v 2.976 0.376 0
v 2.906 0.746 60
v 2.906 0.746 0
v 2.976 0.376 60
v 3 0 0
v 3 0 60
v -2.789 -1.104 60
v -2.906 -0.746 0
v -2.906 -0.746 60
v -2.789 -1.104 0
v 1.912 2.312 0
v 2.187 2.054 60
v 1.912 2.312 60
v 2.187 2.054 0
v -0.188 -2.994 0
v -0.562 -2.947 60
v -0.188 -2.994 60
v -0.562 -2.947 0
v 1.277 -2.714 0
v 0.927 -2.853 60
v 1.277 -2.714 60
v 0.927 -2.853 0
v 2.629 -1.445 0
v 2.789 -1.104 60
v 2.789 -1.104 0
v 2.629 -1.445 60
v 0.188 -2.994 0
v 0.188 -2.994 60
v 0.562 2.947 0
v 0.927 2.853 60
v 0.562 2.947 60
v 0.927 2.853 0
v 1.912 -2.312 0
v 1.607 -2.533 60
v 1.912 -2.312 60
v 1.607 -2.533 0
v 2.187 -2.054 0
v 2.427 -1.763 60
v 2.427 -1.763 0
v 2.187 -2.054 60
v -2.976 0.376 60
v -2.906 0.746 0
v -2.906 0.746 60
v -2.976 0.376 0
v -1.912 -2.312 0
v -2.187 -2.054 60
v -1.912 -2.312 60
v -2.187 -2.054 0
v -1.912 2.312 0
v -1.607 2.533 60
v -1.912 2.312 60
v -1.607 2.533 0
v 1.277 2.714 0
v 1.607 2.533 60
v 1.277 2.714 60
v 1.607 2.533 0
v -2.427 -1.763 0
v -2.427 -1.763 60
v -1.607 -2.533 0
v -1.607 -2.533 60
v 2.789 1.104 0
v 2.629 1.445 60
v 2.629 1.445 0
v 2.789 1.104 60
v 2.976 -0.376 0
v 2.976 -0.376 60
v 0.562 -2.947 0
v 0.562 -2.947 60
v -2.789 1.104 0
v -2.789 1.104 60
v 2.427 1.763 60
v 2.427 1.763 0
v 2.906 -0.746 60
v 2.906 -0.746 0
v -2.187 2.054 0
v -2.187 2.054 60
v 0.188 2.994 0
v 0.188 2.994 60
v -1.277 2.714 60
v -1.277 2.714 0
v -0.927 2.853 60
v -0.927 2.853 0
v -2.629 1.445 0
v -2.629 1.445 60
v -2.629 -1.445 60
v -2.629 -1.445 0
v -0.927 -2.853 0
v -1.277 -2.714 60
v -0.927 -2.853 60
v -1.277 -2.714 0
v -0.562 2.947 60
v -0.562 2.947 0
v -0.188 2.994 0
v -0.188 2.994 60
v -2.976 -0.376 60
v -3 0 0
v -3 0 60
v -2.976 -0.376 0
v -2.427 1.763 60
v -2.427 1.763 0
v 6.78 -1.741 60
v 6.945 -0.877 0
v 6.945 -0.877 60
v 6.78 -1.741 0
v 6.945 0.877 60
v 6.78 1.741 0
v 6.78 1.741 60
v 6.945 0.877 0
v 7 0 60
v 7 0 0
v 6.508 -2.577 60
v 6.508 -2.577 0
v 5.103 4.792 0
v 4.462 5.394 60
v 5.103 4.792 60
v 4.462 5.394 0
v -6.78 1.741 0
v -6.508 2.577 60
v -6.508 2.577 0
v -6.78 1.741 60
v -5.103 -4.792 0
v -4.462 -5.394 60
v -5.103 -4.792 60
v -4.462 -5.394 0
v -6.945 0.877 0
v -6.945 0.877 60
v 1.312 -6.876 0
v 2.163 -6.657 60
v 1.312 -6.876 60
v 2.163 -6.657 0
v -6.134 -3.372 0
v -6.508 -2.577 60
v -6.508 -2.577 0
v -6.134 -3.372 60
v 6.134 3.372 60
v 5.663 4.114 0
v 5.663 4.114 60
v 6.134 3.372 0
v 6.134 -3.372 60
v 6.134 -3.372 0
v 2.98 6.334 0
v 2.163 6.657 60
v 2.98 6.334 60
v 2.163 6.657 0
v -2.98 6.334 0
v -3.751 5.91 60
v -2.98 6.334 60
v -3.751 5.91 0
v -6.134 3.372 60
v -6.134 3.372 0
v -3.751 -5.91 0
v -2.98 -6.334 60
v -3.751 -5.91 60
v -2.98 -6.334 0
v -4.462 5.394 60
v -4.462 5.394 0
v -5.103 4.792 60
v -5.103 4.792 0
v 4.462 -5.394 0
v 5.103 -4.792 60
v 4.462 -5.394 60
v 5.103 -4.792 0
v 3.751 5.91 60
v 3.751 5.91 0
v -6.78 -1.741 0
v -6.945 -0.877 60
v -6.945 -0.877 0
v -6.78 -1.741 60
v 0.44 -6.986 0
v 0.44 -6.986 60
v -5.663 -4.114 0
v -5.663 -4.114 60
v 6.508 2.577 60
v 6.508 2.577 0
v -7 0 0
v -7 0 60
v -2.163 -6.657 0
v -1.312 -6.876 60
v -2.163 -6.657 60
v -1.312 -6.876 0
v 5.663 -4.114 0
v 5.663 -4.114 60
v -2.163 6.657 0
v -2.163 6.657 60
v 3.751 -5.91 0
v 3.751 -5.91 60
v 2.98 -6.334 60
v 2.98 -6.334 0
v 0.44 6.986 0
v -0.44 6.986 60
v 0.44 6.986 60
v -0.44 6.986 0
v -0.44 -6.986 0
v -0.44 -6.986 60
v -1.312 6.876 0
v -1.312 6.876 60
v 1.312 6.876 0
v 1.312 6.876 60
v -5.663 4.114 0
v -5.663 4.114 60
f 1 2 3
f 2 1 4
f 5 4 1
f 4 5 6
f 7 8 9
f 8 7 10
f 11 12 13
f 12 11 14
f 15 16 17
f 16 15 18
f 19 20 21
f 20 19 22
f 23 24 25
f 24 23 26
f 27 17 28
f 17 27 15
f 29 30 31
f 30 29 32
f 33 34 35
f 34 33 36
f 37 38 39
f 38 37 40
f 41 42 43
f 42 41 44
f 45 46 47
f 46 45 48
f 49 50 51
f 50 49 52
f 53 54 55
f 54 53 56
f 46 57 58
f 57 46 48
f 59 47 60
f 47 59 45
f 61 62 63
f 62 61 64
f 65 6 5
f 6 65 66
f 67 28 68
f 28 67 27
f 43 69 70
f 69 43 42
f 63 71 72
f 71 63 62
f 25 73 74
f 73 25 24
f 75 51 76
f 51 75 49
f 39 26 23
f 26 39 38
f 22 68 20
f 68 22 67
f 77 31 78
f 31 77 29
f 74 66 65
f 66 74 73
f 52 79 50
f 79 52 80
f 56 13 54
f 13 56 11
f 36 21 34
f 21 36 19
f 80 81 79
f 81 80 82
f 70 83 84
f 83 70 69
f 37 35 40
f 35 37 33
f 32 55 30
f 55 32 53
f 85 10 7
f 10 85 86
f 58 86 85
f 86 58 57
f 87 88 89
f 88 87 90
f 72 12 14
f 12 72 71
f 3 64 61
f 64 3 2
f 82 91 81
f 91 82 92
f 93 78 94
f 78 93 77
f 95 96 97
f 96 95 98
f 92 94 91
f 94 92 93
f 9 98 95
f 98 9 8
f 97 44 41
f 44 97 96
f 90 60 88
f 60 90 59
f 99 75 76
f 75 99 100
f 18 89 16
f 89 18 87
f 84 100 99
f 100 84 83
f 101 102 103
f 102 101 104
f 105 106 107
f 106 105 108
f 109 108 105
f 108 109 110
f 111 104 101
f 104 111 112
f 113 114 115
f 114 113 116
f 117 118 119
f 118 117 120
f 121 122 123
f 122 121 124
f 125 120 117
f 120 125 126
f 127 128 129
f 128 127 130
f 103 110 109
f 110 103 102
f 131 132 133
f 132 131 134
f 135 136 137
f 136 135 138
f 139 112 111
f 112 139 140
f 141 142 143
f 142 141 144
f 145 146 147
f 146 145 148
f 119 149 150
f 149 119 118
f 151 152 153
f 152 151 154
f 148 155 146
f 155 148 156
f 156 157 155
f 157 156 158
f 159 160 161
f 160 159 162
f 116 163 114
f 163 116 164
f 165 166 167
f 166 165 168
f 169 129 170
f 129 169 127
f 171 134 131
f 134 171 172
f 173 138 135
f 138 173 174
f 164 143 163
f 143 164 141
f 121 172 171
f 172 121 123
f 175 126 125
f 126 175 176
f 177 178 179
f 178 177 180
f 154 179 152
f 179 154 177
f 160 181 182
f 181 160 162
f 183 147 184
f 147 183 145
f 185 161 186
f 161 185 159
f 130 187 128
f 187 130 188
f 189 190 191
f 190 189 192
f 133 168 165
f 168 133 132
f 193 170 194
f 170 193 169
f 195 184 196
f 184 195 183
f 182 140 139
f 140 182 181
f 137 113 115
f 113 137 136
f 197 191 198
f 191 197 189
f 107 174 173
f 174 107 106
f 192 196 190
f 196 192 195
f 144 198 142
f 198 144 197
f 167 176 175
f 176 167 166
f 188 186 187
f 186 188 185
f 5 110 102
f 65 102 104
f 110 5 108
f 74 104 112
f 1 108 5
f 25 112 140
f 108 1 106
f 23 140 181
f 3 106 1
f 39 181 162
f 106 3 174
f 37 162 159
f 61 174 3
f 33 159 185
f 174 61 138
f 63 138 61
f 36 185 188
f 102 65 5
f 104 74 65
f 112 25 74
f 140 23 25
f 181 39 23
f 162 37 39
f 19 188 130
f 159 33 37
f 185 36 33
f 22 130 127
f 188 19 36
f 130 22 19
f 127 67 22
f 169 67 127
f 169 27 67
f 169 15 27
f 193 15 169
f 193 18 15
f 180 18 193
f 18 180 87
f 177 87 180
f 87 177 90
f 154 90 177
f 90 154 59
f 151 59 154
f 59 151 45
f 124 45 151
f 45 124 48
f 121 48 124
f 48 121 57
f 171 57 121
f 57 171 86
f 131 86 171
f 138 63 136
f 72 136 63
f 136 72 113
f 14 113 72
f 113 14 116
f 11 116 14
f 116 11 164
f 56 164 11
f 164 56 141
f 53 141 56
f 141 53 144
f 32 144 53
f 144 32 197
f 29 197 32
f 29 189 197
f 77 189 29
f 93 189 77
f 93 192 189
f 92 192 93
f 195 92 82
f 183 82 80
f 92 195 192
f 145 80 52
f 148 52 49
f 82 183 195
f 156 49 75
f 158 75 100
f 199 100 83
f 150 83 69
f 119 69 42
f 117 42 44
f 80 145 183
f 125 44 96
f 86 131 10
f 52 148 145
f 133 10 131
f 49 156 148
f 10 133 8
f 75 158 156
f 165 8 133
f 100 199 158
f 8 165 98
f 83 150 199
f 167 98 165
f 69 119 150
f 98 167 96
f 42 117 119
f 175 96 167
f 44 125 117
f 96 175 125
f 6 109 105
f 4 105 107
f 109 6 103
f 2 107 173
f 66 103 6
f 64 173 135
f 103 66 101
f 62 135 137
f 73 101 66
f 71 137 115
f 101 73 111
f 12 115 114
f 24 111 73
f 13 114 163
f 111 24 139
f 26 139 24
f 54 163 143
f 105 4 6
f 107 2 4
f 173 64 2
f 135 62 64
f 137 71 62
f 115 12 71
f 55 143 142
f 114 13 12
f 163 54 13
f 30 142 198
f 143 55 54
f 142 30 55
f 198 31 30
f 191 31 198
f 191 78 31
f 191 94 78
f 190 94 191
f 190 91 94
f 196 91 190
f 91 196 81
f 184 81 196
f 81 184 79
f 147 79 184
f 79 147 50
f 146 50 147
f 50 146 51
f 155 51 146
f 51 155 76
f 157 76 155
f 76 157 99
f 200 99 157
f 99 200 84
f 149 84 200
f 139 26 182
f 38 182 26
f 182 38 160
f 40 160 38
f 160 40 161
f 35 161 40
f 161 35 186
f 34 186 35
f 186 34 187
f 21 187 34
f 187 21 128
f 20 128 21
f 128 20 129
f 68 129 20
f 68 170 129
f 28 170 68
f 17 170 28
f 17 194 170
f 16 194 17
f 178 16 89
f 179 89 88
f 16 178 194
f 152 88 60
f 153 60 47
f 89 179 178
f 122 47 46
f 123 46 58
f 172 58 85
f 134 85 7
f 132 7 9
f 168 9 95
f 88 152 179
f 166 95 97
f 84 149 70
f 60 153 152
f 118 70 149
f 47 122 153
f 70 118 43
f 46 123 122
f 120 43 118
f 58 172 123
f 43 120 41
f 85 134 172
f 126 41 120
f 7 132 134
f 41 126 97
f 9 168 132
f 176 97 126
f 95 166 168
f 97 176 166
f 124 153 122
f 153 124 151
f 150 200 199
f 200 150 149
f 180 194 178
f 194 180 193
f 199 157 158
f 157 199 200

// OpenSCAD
$fn = 50;

difference() {
	union() {
		cylinder(h = 60, r = 7.0);
	}
	union() {
		translate(v = [0, 0, -100]) {
			cylinder(h = 200, r = 3.0);
		}
		translate(v = [0, 0, -100]) {
			cylinder(h = 200, r = 1.5);
		}
	}
}
